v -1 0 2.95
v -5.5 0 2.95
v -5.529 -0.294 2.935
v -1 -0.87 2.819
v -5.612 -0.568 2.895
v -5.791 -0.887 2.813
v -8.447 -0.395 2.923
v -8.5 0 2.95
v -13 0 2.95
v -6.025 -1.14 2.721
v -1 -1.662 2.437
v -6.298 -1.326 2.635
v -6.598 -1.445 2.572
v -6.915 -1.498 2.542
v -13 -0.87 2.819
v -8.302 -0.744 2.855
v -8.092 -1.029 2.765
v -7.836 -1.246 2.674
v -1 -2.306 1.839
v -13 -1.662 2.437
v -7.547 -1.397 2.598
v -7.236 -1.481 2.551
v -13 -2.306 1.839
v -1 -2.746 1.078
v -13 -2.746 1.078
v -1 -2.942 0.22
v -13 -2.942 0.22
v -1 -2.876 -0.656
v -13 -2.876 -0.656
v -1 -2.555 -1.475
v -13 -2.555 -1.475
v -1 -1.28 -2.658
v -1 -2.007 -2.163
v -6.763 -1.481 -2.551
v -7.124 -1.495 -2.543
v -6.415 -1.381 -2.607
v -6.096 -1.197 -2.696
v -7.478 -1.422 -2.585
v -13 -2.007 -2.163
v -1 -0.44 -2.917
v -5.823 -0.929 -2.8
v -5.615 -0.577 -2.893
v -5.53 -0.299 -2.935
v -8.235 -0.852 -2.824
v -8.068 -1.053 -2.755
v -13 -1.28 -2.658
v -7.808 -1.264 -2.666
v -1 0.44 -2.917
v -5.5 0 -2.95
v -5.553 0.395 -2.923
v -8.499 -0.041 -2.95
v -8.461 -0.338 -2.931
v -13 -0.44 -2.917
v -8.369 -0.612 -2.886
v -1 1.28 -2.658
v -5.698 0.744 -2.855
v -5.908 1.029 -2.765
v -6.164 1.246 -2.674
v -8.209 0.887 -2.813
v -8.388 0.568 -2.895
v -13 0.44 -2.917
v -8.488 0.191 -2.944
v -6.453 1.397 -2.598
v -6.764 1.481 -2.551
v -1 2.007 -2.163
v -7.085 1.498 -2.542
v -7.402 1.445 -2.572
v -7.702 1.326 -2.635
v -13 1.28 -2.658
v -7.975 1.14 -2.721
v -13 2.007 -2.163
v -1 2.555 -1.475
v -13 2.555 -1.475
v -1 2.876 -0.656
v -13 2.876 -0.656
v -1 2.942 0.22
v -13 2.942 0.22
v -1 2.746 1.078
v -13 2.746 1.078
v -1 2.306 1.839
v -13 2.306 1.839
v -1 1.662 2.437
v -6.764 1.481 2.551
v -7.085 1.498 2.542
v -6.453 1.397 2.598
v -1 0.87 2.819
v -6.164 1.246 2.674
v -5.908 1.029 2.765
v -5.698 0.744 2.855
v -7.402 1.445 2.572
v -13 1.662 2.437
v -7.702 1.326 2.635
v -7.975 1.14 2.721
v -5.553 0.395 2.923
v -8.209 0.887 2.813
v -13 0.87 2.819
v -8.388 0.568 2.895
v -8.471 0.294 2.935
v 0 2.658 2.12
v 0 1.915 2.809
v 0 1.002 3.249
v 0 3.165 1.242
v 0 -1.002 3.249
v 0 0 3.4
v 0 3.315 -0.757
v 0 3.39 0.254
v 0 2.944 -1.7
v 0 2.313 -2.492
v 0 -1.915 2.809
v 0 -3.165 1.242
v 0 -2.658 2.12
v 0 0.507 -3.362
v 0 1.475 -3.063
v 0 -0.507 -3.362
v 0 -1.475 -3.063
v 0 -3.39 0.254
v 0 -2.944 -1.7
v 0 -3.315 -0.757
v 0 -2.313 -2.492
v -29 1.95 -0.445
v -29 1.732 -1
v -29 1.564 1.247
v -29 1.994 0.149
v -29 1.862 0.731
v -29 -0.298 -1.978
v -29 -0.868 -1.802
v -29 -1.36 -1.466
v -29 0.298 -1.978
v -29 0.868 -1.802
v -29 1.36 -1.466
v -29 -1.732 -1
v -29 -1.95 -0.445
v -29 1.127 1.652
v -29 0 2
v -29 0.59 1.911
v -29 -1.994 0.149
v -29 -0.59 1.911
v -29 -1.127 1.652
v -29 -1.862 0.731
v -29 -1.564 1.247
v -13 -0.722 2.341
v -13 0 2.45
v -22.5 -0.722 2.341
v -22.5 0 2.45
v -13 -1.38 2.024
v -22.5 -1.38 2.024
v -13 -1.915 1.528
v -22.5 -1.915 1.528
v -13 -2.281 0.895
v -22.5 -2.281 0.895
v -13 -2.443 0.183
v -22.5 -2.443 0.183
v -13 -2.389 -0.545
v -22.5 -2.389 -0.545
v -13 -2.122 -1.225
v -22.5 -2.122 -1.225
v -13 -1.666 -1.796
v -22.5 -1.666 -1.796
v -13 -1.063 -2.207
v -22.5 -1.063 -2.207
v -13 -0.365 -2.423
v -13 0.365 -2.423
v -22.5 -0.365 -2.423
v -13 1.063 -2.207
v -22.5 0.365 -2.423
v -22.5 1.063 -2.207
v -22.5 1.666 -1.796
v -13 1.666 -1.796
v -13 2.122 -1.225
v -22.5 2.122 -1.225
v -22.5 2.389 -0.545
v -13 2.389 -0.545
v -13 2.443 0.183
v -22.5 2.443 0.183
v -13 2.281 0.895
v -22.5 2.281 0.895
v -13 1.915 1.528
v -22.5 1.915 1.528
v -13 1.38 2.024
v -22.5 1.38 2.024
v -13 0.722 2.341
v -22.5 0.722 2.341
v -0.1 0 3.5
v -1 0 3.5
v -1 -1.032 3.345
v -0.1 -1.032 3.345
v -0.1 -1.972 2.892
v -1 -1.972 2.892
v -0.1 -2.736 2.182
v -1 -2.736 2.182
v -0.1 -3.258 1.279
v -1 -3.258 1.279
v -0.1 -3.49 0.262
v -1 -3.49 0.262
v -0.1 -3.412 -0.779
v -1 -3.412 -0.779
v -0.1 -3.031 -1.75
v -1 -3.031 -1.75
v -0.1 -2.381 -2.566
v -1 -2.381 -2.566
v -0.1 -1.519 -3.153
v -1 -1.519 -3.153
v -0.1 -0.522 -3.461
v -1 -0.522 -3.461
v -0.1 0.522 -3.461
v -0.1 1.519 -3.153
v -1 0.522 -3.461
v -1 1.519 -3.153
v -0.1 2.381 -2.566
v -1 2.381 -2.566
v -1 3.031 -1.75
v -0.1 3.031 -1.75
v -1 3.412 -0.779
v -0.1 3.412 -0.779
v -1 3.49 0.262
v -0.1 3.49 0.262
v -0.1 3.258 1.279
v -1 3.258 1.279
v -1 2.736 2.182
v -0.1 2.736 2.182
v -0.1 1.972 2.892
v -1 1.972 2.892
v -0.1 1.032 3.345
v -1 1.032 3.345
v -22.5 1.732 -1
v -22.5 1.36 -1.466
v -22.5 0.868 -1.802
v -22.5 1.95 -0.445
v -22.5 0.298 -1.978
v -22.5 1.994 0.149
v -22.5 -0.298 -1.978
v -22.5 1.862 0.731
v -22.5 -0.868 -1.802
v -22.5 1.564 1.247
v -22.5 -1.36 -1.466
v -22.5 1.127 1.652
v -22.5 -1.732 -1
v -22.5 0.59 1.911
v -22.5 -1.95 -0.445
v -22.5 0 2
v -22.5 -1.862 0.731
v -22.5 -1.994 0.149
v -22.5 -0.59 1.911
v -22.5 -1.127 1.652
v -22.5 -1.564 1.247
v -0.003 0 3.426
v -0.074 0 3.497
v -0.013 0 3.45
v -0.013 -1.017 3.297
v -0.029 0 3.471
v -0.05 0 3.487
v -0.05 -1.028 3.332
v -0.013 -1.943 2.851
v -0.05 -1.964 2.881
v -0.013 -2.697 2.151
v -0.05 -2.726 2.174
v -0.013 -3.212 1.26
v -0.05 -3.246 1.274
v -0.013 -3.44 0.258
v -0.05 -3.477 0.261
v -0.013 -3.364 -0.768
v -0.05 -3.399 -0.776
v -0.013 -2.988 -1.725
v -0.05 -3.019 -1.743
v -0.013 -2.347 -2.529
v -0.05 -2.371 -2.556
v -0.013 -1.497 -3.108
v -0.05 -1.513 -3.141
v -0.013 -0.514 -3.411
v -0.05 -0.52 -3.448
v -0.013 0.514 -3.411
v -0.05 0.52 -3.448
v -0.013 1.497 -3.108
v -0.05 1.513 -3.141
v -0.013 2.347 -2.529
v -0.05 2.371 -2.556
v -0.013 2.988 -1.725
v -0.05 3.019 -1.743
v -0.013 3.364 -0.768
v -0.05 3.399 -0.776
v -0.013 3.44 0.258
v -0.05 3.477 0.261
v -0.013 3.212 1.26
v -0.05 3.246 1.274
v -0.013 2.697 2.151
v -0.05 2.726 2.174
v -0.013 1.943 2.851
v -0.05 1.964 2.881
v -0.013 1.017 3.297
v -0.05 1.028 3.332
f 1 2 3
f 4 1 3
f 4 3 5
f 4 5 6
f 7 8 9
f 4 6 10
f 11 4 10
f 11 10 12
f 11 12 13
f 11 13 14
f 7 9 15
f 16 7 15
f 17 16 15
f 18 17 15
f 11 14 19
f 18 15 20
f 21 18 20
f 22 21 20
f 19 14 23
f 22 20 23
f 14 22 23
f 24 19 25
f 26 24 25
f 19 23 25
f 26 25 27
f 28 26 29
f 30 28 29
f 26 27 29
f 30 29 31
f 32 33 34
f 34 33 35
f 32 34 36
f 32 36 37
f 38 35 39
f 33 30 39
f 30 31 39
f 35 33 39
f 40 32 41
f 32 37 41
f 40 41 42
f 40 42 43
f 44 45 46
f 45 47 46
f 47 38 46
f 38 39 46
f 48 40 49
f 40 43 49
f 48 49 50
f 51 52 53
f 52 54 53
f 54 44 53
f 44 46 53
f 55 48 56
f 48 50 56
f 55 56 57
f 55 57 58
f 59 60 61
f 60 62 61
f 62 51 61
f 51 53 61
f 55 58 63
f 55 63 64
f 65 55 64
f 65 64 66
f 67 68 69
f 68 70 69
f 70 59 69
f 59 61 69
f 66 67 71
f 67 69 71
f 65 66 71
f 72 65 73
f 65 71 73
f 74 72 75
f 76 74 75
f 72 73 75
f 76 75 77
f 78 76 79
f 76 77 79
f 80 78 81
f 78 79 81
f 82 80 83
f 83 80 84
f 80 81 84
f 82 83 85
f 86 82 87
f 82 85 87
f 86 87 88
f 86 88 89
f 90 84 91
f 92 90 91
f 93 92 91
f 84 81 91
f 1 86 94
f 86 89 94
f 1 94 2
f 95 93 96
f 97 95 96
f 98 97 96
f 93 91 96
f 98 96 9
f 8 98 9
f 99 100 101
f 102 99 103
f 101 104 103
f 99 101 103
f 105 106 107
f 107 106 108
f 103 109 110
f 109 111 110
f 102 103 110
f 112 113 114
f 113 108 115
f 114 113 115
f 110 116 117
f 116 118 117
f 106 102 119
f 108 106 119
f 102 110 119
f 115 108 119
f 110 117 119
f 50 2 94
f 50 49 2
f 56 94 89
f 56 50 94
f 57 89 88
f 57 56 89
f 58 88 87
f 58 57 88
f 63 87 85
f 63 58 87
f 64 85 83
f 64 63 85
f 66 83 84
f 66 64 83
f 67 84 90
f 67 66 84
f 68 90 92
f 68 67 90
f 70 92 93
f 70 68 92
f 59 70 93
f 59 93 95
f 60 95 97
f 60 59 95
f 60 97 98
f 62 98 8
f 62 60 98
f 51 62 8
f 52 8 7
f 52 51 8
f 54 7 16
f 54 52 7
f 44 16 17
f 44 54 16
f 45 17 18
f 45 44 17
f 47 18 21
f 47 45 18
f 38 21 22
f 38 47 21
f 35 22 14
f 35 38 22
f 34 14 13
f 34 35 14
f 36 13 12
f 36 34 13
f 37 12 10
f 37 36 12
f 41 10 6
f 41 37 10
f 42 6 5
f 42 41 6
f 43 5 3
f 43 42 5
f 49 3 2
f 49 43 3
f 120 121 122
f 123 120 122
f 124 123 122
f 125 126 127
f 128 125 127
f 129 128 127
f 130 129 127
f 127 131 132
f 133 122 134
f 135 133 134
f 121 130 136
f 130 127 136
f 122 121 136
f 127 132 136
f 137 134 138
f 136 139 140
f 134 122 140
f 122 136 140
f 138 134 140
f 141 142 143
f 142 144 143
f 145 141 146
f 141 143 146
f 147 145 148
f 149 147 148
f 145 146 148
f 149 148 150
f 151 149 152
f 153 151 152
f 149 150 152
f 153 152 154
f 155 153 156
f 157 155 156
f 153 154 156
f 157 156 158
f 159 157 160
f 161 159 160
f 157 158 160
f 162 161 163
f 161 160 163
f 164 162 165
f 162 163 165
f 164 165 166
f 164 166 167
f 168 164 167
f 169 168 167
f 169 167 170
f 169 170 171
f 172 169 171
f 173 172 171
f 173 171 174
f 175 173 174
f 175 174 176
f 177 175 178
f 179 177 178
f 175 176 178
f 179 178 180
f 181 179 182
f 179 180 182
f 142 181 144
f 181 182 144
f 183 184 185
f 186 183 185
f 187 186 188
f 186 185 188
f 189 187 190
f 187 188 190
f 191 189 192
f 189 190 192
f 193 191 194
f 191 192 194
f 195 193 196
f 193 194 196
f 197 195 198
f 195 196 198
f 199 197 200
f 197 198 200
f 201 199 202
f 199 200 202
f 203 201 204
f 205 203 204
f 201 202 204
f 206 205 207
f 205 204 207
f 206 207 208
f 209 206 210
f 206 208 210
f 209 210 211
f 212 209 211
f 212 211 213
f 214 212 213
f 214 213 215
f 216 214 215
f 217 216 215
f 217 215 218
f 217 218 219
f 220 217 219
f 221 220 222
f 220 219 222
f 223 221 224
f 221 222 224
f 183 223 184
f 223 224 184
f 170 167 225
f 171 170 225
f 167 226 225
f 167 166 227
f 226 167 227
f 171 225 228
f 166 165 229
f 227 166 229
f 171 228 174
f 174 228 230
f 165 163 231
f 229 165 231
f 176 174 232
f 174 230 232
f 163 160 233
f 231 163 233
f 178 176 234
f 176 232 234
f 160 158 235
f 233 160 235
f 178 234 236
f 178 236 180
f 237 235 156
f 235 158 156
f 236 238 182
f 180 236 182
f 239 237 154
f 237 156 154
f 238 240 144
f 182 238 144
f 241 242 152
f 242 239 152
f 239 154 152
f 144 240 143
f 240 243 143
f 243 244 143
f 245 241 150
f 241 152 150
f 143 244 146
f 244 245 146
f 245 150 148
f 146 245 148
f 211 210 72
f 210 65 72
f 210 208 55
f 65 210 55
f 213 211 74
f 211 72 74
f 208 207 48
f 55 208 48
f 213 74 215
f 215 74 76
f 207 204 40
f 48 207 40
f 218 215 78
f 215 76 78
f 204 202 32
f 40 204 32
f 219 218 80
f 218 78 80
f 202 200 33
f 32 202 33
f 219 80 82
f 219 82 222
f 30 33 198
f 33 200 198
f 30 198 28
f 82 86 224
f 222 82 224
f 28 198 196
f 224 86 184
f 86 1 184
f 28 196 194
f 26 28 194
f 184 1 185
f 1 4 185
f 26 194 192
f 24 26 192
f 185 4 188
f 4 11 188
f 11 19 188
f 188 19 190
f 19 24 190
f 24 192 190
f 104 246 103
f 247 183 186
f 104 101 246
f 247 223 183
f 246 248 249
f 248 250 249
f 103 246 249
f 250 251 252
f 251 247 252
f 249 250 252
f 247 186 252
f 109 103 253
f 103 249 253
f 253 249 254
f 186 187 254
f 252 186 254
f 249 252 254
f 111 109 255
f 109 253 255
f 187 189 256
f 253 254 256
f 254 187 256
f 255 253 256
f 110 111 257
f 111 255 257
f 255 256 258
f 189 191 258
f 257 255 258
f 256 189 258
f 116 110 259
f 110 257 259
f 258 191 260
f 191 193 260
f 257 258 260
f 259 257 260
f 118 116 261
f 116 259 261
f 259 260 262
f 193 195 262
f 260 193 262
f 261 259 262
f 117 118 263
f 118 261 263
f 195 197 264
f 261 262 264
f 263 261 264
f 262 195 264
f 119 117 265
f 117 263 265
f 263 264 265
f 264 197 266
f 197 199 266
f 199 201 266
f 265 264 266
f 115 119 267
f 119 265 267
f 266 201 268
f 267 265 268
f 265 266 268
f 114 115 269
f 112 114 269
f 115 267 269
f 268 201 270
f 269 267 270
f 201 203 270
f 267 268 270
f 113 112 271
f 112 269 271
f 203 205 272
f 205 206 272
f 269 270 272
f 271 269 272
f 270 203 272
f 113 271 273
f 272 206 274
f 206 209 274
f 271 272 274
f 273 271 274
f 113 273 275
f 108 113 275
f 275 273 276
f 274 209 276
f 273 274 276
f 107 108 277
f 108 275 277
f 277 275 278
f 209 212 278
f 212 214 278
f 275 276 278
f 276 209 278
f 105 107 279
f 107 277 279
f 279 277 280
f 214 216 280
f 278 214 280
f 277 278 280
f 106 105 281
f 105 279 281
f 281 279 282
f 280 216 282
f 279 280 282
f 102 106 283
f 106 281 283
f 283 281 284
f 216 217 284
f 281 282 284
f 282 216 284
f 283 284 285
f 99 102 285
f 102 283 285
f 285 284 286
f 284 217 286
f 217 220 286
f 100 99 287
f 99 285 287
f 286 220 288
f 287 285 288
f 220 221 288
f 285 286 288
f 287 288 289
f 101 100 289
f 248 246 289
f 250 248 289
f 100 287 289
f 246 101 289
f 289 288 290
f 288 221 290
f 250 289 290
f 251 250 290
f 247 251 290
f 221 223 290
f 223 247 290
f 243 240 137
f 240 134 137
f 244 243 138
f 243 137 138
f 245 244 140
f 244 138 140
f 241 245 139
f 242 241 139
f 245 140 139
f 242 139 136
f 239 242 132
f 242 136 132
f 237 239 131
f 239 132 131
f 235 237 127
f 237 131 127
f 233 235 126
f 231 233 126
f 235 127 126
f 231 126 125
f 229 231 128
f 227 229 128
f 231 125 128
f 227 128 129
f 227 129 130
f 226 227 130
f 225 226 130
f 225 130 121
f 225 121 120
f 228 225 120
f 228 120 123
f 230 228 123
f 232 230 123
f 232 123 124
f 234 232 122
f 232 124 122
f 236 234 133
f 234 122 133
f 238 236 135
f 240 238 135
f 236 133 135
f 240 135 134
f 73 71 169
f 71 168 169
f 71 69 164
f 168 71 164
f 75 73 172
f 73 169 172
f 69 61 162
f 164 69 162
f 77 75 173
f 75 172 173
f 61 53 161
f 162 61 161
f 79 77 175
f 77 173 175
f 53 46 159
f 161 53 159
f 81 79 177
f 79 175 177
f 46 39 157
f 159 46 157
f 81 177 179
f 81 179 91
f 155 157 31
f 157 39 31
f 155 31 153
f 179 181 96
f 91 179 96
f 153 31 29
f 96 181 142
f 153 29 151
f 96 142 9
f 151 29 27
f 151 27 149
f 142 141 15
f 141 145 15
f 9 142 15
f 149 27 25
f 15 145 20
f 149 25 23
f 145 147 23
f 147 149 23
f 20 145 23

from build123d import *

# Parameters (mm, degrees)
CUT_EXTRUDE1_REACH                  = 31.419
CUT_EXTRUDE1_END_RADIUS             = 2.95
SKETCH2_R                           = 1.5
CUT_EXTRUDE1_DIRECTION_2_REACH      = 31.419
CUT_EXTRUDE1_DIRECTION_2_END_RADIUS = 2.95
FILLET1_R                           = 0.1


with BuildPart() as part:
    # Sketch1 → Revolve1 (revolve)
    with BuildSketch(Plane(origin=(0, 0, 0), x_dir=(1, 0, 0), z_dir=(0, 1, 0)), mode=Mode.PRIVATE) as revolve1_sk:
        Polygon((-29, 0), (0, 0), (0, 3.5), (-1, 3.5), (-1, 2.95), (-13, 2.95), (-13, 2.45), (-22.5, 2.45), (-22.5, 2), (-29, 2), align=None)
    revolve(revolve1_sk.sketch.rotate(Axis((-33.923612536, 0, 0), (1, 0, 0)), 180), axis=Axis((-33.923612536, 0, 0), (1, 0, 0)))

    # Cut-Extrude1: up to this cylinder (the profile starts inside it)
    cut_extrude1_end = Plane(origin=(-7, 0, 0), z_dir=(-1, 0, 0)) * Cylinder(CUT_EXTRUDE1_END_RADIUS, 69.738, mode=Mode.PRIVATE)
    # Sketch2 → Cut-Extrude1 (cut, up to the surface)
    with BuildSketch(Plane.XY, mode=Mode.PRIVATE) as cut_extrude1_sk1:
        with Locations((-7, 0)):
            Circle(SKETCH2_R)
    cut_extrude1_tool1 = extrude(cut_extrude1_sk1.sketch, amount=-CUT_EXTRUDE1_REACH, mode=Mode.PRIVATE) & cut_extrude1_end
    add(cut_extrude1_tool1.solids().sort_by_distance((-7, 0, 0))[0], mode=Mode.SUBTRACT)

    # Cut-Extrude1 direction 2: up to this cylinder (the profile starts inside it)
    cut_extrude1_direction_2_end = Plane(origin=(-7, 0, 0), z_dir=(-1, 0, 0)) * Cylinder(CUT_EXTRUDE1_DIRECTION_2_END_RADIUS, 69.738, mode=Mode.PRIVATE)
    # Sketch2 → Cut-Extrude1 direction 2 (cut, up to the surface)
    with BuildSketch(Plane.XY, mode=Mode.PRIVATE) as cut_extrude1_direction_2_sk1:
        with Locations((-7, 0)):
            Circle(SKETCH2_R)
    cut_extrude1_direction_2_tool1 = extrude(cut_extrude1_direction_2_sk1.sketch, amount=CUT_EXTRUDE1_DIRECTION_2_REACH, mode=Mode.PRIVATE) & cut_extrude1_direction_2_end
    add(cut_extrude1_direction_2_tool1.solids().sort_by_distance((-7, 0, 0))[0], mode=Mode.SUBTRACT)

    # Fillet1
    fillet1_edges = [part.edges().sort_by_distance(p)[0] for p in [
        (0, 0, -3.5),
    ]]
    fillet(fillet1_edges, radius=FILLET1_R)


solid = part.part
